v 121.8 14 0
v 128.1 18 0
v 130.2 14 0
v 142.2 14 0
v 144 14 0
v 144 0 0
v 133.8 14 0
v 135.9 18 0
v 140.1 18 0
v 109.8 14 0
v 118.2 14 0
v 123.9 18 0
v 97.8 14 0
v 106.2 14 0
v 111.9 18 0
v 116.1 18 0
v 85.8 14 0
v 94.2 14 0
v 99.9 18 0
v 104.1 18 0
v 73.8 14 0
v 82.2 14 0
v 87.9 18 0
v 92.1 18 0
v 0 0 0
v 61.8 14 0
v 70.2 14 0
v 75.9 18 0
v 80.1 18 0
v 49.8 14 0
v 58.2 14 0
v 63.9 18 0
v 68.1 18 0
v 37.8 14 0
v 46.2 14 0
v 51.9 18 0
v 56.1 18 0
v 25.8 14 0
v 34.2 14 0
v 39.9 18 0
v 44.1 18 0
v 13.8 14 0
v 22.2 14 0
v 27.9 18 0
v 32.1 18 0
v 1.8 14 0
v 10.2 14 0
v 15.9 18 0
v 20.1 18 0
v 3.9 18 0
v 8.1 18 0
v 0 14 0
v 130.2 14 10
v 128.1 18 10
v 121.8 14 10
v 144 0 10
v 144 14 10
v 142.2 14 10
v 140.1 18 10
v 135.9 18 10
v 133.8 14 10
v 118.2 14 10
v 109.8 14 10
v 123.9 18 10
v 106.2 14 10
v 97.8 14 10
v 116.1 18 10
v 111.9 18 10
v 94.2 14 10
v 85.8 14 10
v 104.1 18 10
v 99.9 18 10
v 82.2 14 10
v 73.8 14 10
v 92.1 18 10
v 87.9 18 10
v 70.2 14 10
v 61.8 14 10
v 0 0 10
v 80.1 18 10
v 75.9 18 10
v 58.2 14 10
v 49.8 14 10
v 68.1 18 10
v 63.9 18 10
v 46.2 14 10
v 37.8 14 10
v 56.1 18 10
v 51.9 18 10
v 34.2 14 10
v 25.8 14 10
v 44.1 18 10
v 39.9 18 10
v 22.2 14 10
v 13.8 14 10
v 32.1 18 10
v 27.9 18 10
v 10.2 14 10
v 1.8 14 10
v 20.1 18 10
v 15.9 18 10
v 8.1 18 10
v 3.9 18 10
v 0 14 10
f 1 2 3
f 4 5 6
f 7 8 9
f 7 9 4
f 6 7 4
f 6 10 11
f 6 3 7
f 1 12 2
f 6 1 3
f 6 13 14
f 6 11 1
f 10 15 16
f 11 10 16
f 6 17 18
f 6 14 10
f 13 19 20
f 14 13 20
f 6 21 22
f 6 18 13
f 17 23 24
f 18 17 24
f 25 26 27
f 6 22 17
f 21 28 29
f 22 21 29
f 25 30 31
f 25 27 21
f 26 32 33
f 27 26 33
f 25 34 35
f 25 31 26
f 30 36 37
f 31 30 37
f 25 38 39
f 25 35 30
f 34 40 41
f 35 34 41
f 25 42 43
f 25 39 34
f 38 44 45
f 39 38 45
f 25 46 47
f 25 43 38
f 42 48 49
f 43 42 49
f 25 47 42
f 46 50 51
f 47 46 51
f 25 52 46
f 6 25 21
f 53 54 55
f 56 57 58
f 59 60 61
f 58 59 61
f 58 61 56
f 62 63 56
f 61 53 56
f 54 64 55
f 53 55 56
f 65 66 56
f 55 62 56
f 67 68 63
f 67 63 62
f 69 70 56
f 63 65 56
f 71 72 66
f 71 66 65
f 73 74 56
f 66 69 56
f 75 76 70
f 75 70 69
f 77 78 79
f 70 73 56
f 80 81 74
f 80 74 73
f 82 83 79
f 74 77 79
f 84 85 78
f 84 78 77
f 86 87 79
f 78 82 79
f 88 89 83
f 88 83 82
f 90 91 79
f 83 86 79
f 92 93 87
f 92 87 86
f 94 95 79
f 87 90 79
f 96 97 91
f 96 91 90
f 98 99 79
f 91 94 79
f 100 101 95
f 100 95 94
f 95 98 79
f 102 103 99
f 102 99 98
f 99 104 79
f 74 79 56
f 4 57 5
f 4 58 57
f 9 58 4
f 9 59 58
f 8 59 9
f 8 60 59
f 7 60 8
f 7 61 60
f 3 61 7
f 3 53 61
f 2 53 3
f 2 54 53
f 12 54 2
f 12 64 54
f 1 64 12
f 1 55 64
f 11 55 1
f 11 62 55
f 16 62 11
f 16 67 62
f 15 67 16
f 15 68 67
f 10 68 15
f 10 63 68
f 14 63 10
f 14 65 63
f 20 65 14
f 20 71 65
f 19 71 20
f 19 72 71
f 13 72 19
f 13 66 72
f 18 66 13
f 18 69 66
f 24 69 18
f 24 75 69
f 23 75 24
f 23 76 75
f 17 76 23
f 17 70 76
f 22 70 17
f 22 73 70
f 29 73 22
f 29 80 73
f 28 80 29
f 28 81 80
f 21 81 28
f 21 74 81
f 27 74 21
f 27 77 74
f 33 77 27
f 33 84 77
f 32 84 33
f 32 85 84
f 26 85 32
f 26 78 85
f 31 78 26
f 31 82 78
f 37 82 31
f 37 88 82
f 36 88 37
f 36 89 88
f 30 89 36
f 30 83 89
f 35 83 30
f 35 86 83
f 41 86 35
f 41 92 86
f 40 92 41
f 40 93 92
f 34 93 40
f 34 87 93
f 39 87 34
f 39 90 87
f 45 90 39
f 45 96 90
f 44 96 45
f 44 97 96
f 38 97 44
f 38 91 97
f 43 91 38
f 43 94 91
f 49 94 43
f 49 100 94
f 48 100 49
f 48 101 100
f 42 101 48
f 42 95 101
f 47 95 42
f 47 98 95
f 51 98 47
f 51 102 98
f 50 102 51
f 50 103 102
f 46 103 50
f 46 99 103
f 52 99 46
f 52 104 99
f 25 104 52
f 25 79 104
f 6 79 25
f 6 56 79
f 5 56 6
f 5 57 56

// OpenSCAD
$fn = 32;

// ----------------------------------------------------------------------
// Gear rack: 12 teeth, pitch 12 mm
// ----------------------------------------------------------------------

// --- parameters (mm) ---
teeth = 12;               // number of teeth
pitch = 12;               // tooth pitch, X
root_w = 8.4;             // tooth width at the root
tip_w = 4.2;              // tooth width at the tip
base_h = 14;              // rack body height, Y
tooth_h = 4;              // tooth height above the body
plate_t = 10;             // rack width, Z (extrusion height)

rack_l = teeth * pitch;  // overall length
total_h = base_h + tooth_h;  // overall height

profile = [[0, 0], [144, 0], [144, 14], [142.2, 14], [140.1, 18], [135.9, 18], [133.8, 14], [130.2, 14], [128.1, 18], [123.9, 18], [121.8, 14], [118.2, 14], [116.1, 18], [111.9, 18], [109.8, 14], [106.2, 14], [104.1, 18], [99.9, 18], [97.8, 14], [94.2, 14], [92.1, 18], [87.9, 18], [85.8, 14], [82.2, 14], [80.1, 18], [75.9, 18], [73.8, 14], [70.2, 14], [68.1, 18], [63.9, 18], [61.8, 14], [58.2, 14], [56.1, 18], [51.9, 18], [49.8, 14], [46.2, 14], [44.1, 18], [39.9, 18], [37.8, 14], [34.2, 14], [32.1, 18], [27.9, 18], [25.8, 14], [22.2, 14], [20.1, 18], [15.9, 18], [13.8, 14], [10.2, 14], [8.1, 18], [3.9, 18], [1.8, 14], [0, 14]];  // primary outline, 52 points, counter clockwise

// --- the one profile operation ---
linear_extrude(height = plate_t) polygon(points = profile);
